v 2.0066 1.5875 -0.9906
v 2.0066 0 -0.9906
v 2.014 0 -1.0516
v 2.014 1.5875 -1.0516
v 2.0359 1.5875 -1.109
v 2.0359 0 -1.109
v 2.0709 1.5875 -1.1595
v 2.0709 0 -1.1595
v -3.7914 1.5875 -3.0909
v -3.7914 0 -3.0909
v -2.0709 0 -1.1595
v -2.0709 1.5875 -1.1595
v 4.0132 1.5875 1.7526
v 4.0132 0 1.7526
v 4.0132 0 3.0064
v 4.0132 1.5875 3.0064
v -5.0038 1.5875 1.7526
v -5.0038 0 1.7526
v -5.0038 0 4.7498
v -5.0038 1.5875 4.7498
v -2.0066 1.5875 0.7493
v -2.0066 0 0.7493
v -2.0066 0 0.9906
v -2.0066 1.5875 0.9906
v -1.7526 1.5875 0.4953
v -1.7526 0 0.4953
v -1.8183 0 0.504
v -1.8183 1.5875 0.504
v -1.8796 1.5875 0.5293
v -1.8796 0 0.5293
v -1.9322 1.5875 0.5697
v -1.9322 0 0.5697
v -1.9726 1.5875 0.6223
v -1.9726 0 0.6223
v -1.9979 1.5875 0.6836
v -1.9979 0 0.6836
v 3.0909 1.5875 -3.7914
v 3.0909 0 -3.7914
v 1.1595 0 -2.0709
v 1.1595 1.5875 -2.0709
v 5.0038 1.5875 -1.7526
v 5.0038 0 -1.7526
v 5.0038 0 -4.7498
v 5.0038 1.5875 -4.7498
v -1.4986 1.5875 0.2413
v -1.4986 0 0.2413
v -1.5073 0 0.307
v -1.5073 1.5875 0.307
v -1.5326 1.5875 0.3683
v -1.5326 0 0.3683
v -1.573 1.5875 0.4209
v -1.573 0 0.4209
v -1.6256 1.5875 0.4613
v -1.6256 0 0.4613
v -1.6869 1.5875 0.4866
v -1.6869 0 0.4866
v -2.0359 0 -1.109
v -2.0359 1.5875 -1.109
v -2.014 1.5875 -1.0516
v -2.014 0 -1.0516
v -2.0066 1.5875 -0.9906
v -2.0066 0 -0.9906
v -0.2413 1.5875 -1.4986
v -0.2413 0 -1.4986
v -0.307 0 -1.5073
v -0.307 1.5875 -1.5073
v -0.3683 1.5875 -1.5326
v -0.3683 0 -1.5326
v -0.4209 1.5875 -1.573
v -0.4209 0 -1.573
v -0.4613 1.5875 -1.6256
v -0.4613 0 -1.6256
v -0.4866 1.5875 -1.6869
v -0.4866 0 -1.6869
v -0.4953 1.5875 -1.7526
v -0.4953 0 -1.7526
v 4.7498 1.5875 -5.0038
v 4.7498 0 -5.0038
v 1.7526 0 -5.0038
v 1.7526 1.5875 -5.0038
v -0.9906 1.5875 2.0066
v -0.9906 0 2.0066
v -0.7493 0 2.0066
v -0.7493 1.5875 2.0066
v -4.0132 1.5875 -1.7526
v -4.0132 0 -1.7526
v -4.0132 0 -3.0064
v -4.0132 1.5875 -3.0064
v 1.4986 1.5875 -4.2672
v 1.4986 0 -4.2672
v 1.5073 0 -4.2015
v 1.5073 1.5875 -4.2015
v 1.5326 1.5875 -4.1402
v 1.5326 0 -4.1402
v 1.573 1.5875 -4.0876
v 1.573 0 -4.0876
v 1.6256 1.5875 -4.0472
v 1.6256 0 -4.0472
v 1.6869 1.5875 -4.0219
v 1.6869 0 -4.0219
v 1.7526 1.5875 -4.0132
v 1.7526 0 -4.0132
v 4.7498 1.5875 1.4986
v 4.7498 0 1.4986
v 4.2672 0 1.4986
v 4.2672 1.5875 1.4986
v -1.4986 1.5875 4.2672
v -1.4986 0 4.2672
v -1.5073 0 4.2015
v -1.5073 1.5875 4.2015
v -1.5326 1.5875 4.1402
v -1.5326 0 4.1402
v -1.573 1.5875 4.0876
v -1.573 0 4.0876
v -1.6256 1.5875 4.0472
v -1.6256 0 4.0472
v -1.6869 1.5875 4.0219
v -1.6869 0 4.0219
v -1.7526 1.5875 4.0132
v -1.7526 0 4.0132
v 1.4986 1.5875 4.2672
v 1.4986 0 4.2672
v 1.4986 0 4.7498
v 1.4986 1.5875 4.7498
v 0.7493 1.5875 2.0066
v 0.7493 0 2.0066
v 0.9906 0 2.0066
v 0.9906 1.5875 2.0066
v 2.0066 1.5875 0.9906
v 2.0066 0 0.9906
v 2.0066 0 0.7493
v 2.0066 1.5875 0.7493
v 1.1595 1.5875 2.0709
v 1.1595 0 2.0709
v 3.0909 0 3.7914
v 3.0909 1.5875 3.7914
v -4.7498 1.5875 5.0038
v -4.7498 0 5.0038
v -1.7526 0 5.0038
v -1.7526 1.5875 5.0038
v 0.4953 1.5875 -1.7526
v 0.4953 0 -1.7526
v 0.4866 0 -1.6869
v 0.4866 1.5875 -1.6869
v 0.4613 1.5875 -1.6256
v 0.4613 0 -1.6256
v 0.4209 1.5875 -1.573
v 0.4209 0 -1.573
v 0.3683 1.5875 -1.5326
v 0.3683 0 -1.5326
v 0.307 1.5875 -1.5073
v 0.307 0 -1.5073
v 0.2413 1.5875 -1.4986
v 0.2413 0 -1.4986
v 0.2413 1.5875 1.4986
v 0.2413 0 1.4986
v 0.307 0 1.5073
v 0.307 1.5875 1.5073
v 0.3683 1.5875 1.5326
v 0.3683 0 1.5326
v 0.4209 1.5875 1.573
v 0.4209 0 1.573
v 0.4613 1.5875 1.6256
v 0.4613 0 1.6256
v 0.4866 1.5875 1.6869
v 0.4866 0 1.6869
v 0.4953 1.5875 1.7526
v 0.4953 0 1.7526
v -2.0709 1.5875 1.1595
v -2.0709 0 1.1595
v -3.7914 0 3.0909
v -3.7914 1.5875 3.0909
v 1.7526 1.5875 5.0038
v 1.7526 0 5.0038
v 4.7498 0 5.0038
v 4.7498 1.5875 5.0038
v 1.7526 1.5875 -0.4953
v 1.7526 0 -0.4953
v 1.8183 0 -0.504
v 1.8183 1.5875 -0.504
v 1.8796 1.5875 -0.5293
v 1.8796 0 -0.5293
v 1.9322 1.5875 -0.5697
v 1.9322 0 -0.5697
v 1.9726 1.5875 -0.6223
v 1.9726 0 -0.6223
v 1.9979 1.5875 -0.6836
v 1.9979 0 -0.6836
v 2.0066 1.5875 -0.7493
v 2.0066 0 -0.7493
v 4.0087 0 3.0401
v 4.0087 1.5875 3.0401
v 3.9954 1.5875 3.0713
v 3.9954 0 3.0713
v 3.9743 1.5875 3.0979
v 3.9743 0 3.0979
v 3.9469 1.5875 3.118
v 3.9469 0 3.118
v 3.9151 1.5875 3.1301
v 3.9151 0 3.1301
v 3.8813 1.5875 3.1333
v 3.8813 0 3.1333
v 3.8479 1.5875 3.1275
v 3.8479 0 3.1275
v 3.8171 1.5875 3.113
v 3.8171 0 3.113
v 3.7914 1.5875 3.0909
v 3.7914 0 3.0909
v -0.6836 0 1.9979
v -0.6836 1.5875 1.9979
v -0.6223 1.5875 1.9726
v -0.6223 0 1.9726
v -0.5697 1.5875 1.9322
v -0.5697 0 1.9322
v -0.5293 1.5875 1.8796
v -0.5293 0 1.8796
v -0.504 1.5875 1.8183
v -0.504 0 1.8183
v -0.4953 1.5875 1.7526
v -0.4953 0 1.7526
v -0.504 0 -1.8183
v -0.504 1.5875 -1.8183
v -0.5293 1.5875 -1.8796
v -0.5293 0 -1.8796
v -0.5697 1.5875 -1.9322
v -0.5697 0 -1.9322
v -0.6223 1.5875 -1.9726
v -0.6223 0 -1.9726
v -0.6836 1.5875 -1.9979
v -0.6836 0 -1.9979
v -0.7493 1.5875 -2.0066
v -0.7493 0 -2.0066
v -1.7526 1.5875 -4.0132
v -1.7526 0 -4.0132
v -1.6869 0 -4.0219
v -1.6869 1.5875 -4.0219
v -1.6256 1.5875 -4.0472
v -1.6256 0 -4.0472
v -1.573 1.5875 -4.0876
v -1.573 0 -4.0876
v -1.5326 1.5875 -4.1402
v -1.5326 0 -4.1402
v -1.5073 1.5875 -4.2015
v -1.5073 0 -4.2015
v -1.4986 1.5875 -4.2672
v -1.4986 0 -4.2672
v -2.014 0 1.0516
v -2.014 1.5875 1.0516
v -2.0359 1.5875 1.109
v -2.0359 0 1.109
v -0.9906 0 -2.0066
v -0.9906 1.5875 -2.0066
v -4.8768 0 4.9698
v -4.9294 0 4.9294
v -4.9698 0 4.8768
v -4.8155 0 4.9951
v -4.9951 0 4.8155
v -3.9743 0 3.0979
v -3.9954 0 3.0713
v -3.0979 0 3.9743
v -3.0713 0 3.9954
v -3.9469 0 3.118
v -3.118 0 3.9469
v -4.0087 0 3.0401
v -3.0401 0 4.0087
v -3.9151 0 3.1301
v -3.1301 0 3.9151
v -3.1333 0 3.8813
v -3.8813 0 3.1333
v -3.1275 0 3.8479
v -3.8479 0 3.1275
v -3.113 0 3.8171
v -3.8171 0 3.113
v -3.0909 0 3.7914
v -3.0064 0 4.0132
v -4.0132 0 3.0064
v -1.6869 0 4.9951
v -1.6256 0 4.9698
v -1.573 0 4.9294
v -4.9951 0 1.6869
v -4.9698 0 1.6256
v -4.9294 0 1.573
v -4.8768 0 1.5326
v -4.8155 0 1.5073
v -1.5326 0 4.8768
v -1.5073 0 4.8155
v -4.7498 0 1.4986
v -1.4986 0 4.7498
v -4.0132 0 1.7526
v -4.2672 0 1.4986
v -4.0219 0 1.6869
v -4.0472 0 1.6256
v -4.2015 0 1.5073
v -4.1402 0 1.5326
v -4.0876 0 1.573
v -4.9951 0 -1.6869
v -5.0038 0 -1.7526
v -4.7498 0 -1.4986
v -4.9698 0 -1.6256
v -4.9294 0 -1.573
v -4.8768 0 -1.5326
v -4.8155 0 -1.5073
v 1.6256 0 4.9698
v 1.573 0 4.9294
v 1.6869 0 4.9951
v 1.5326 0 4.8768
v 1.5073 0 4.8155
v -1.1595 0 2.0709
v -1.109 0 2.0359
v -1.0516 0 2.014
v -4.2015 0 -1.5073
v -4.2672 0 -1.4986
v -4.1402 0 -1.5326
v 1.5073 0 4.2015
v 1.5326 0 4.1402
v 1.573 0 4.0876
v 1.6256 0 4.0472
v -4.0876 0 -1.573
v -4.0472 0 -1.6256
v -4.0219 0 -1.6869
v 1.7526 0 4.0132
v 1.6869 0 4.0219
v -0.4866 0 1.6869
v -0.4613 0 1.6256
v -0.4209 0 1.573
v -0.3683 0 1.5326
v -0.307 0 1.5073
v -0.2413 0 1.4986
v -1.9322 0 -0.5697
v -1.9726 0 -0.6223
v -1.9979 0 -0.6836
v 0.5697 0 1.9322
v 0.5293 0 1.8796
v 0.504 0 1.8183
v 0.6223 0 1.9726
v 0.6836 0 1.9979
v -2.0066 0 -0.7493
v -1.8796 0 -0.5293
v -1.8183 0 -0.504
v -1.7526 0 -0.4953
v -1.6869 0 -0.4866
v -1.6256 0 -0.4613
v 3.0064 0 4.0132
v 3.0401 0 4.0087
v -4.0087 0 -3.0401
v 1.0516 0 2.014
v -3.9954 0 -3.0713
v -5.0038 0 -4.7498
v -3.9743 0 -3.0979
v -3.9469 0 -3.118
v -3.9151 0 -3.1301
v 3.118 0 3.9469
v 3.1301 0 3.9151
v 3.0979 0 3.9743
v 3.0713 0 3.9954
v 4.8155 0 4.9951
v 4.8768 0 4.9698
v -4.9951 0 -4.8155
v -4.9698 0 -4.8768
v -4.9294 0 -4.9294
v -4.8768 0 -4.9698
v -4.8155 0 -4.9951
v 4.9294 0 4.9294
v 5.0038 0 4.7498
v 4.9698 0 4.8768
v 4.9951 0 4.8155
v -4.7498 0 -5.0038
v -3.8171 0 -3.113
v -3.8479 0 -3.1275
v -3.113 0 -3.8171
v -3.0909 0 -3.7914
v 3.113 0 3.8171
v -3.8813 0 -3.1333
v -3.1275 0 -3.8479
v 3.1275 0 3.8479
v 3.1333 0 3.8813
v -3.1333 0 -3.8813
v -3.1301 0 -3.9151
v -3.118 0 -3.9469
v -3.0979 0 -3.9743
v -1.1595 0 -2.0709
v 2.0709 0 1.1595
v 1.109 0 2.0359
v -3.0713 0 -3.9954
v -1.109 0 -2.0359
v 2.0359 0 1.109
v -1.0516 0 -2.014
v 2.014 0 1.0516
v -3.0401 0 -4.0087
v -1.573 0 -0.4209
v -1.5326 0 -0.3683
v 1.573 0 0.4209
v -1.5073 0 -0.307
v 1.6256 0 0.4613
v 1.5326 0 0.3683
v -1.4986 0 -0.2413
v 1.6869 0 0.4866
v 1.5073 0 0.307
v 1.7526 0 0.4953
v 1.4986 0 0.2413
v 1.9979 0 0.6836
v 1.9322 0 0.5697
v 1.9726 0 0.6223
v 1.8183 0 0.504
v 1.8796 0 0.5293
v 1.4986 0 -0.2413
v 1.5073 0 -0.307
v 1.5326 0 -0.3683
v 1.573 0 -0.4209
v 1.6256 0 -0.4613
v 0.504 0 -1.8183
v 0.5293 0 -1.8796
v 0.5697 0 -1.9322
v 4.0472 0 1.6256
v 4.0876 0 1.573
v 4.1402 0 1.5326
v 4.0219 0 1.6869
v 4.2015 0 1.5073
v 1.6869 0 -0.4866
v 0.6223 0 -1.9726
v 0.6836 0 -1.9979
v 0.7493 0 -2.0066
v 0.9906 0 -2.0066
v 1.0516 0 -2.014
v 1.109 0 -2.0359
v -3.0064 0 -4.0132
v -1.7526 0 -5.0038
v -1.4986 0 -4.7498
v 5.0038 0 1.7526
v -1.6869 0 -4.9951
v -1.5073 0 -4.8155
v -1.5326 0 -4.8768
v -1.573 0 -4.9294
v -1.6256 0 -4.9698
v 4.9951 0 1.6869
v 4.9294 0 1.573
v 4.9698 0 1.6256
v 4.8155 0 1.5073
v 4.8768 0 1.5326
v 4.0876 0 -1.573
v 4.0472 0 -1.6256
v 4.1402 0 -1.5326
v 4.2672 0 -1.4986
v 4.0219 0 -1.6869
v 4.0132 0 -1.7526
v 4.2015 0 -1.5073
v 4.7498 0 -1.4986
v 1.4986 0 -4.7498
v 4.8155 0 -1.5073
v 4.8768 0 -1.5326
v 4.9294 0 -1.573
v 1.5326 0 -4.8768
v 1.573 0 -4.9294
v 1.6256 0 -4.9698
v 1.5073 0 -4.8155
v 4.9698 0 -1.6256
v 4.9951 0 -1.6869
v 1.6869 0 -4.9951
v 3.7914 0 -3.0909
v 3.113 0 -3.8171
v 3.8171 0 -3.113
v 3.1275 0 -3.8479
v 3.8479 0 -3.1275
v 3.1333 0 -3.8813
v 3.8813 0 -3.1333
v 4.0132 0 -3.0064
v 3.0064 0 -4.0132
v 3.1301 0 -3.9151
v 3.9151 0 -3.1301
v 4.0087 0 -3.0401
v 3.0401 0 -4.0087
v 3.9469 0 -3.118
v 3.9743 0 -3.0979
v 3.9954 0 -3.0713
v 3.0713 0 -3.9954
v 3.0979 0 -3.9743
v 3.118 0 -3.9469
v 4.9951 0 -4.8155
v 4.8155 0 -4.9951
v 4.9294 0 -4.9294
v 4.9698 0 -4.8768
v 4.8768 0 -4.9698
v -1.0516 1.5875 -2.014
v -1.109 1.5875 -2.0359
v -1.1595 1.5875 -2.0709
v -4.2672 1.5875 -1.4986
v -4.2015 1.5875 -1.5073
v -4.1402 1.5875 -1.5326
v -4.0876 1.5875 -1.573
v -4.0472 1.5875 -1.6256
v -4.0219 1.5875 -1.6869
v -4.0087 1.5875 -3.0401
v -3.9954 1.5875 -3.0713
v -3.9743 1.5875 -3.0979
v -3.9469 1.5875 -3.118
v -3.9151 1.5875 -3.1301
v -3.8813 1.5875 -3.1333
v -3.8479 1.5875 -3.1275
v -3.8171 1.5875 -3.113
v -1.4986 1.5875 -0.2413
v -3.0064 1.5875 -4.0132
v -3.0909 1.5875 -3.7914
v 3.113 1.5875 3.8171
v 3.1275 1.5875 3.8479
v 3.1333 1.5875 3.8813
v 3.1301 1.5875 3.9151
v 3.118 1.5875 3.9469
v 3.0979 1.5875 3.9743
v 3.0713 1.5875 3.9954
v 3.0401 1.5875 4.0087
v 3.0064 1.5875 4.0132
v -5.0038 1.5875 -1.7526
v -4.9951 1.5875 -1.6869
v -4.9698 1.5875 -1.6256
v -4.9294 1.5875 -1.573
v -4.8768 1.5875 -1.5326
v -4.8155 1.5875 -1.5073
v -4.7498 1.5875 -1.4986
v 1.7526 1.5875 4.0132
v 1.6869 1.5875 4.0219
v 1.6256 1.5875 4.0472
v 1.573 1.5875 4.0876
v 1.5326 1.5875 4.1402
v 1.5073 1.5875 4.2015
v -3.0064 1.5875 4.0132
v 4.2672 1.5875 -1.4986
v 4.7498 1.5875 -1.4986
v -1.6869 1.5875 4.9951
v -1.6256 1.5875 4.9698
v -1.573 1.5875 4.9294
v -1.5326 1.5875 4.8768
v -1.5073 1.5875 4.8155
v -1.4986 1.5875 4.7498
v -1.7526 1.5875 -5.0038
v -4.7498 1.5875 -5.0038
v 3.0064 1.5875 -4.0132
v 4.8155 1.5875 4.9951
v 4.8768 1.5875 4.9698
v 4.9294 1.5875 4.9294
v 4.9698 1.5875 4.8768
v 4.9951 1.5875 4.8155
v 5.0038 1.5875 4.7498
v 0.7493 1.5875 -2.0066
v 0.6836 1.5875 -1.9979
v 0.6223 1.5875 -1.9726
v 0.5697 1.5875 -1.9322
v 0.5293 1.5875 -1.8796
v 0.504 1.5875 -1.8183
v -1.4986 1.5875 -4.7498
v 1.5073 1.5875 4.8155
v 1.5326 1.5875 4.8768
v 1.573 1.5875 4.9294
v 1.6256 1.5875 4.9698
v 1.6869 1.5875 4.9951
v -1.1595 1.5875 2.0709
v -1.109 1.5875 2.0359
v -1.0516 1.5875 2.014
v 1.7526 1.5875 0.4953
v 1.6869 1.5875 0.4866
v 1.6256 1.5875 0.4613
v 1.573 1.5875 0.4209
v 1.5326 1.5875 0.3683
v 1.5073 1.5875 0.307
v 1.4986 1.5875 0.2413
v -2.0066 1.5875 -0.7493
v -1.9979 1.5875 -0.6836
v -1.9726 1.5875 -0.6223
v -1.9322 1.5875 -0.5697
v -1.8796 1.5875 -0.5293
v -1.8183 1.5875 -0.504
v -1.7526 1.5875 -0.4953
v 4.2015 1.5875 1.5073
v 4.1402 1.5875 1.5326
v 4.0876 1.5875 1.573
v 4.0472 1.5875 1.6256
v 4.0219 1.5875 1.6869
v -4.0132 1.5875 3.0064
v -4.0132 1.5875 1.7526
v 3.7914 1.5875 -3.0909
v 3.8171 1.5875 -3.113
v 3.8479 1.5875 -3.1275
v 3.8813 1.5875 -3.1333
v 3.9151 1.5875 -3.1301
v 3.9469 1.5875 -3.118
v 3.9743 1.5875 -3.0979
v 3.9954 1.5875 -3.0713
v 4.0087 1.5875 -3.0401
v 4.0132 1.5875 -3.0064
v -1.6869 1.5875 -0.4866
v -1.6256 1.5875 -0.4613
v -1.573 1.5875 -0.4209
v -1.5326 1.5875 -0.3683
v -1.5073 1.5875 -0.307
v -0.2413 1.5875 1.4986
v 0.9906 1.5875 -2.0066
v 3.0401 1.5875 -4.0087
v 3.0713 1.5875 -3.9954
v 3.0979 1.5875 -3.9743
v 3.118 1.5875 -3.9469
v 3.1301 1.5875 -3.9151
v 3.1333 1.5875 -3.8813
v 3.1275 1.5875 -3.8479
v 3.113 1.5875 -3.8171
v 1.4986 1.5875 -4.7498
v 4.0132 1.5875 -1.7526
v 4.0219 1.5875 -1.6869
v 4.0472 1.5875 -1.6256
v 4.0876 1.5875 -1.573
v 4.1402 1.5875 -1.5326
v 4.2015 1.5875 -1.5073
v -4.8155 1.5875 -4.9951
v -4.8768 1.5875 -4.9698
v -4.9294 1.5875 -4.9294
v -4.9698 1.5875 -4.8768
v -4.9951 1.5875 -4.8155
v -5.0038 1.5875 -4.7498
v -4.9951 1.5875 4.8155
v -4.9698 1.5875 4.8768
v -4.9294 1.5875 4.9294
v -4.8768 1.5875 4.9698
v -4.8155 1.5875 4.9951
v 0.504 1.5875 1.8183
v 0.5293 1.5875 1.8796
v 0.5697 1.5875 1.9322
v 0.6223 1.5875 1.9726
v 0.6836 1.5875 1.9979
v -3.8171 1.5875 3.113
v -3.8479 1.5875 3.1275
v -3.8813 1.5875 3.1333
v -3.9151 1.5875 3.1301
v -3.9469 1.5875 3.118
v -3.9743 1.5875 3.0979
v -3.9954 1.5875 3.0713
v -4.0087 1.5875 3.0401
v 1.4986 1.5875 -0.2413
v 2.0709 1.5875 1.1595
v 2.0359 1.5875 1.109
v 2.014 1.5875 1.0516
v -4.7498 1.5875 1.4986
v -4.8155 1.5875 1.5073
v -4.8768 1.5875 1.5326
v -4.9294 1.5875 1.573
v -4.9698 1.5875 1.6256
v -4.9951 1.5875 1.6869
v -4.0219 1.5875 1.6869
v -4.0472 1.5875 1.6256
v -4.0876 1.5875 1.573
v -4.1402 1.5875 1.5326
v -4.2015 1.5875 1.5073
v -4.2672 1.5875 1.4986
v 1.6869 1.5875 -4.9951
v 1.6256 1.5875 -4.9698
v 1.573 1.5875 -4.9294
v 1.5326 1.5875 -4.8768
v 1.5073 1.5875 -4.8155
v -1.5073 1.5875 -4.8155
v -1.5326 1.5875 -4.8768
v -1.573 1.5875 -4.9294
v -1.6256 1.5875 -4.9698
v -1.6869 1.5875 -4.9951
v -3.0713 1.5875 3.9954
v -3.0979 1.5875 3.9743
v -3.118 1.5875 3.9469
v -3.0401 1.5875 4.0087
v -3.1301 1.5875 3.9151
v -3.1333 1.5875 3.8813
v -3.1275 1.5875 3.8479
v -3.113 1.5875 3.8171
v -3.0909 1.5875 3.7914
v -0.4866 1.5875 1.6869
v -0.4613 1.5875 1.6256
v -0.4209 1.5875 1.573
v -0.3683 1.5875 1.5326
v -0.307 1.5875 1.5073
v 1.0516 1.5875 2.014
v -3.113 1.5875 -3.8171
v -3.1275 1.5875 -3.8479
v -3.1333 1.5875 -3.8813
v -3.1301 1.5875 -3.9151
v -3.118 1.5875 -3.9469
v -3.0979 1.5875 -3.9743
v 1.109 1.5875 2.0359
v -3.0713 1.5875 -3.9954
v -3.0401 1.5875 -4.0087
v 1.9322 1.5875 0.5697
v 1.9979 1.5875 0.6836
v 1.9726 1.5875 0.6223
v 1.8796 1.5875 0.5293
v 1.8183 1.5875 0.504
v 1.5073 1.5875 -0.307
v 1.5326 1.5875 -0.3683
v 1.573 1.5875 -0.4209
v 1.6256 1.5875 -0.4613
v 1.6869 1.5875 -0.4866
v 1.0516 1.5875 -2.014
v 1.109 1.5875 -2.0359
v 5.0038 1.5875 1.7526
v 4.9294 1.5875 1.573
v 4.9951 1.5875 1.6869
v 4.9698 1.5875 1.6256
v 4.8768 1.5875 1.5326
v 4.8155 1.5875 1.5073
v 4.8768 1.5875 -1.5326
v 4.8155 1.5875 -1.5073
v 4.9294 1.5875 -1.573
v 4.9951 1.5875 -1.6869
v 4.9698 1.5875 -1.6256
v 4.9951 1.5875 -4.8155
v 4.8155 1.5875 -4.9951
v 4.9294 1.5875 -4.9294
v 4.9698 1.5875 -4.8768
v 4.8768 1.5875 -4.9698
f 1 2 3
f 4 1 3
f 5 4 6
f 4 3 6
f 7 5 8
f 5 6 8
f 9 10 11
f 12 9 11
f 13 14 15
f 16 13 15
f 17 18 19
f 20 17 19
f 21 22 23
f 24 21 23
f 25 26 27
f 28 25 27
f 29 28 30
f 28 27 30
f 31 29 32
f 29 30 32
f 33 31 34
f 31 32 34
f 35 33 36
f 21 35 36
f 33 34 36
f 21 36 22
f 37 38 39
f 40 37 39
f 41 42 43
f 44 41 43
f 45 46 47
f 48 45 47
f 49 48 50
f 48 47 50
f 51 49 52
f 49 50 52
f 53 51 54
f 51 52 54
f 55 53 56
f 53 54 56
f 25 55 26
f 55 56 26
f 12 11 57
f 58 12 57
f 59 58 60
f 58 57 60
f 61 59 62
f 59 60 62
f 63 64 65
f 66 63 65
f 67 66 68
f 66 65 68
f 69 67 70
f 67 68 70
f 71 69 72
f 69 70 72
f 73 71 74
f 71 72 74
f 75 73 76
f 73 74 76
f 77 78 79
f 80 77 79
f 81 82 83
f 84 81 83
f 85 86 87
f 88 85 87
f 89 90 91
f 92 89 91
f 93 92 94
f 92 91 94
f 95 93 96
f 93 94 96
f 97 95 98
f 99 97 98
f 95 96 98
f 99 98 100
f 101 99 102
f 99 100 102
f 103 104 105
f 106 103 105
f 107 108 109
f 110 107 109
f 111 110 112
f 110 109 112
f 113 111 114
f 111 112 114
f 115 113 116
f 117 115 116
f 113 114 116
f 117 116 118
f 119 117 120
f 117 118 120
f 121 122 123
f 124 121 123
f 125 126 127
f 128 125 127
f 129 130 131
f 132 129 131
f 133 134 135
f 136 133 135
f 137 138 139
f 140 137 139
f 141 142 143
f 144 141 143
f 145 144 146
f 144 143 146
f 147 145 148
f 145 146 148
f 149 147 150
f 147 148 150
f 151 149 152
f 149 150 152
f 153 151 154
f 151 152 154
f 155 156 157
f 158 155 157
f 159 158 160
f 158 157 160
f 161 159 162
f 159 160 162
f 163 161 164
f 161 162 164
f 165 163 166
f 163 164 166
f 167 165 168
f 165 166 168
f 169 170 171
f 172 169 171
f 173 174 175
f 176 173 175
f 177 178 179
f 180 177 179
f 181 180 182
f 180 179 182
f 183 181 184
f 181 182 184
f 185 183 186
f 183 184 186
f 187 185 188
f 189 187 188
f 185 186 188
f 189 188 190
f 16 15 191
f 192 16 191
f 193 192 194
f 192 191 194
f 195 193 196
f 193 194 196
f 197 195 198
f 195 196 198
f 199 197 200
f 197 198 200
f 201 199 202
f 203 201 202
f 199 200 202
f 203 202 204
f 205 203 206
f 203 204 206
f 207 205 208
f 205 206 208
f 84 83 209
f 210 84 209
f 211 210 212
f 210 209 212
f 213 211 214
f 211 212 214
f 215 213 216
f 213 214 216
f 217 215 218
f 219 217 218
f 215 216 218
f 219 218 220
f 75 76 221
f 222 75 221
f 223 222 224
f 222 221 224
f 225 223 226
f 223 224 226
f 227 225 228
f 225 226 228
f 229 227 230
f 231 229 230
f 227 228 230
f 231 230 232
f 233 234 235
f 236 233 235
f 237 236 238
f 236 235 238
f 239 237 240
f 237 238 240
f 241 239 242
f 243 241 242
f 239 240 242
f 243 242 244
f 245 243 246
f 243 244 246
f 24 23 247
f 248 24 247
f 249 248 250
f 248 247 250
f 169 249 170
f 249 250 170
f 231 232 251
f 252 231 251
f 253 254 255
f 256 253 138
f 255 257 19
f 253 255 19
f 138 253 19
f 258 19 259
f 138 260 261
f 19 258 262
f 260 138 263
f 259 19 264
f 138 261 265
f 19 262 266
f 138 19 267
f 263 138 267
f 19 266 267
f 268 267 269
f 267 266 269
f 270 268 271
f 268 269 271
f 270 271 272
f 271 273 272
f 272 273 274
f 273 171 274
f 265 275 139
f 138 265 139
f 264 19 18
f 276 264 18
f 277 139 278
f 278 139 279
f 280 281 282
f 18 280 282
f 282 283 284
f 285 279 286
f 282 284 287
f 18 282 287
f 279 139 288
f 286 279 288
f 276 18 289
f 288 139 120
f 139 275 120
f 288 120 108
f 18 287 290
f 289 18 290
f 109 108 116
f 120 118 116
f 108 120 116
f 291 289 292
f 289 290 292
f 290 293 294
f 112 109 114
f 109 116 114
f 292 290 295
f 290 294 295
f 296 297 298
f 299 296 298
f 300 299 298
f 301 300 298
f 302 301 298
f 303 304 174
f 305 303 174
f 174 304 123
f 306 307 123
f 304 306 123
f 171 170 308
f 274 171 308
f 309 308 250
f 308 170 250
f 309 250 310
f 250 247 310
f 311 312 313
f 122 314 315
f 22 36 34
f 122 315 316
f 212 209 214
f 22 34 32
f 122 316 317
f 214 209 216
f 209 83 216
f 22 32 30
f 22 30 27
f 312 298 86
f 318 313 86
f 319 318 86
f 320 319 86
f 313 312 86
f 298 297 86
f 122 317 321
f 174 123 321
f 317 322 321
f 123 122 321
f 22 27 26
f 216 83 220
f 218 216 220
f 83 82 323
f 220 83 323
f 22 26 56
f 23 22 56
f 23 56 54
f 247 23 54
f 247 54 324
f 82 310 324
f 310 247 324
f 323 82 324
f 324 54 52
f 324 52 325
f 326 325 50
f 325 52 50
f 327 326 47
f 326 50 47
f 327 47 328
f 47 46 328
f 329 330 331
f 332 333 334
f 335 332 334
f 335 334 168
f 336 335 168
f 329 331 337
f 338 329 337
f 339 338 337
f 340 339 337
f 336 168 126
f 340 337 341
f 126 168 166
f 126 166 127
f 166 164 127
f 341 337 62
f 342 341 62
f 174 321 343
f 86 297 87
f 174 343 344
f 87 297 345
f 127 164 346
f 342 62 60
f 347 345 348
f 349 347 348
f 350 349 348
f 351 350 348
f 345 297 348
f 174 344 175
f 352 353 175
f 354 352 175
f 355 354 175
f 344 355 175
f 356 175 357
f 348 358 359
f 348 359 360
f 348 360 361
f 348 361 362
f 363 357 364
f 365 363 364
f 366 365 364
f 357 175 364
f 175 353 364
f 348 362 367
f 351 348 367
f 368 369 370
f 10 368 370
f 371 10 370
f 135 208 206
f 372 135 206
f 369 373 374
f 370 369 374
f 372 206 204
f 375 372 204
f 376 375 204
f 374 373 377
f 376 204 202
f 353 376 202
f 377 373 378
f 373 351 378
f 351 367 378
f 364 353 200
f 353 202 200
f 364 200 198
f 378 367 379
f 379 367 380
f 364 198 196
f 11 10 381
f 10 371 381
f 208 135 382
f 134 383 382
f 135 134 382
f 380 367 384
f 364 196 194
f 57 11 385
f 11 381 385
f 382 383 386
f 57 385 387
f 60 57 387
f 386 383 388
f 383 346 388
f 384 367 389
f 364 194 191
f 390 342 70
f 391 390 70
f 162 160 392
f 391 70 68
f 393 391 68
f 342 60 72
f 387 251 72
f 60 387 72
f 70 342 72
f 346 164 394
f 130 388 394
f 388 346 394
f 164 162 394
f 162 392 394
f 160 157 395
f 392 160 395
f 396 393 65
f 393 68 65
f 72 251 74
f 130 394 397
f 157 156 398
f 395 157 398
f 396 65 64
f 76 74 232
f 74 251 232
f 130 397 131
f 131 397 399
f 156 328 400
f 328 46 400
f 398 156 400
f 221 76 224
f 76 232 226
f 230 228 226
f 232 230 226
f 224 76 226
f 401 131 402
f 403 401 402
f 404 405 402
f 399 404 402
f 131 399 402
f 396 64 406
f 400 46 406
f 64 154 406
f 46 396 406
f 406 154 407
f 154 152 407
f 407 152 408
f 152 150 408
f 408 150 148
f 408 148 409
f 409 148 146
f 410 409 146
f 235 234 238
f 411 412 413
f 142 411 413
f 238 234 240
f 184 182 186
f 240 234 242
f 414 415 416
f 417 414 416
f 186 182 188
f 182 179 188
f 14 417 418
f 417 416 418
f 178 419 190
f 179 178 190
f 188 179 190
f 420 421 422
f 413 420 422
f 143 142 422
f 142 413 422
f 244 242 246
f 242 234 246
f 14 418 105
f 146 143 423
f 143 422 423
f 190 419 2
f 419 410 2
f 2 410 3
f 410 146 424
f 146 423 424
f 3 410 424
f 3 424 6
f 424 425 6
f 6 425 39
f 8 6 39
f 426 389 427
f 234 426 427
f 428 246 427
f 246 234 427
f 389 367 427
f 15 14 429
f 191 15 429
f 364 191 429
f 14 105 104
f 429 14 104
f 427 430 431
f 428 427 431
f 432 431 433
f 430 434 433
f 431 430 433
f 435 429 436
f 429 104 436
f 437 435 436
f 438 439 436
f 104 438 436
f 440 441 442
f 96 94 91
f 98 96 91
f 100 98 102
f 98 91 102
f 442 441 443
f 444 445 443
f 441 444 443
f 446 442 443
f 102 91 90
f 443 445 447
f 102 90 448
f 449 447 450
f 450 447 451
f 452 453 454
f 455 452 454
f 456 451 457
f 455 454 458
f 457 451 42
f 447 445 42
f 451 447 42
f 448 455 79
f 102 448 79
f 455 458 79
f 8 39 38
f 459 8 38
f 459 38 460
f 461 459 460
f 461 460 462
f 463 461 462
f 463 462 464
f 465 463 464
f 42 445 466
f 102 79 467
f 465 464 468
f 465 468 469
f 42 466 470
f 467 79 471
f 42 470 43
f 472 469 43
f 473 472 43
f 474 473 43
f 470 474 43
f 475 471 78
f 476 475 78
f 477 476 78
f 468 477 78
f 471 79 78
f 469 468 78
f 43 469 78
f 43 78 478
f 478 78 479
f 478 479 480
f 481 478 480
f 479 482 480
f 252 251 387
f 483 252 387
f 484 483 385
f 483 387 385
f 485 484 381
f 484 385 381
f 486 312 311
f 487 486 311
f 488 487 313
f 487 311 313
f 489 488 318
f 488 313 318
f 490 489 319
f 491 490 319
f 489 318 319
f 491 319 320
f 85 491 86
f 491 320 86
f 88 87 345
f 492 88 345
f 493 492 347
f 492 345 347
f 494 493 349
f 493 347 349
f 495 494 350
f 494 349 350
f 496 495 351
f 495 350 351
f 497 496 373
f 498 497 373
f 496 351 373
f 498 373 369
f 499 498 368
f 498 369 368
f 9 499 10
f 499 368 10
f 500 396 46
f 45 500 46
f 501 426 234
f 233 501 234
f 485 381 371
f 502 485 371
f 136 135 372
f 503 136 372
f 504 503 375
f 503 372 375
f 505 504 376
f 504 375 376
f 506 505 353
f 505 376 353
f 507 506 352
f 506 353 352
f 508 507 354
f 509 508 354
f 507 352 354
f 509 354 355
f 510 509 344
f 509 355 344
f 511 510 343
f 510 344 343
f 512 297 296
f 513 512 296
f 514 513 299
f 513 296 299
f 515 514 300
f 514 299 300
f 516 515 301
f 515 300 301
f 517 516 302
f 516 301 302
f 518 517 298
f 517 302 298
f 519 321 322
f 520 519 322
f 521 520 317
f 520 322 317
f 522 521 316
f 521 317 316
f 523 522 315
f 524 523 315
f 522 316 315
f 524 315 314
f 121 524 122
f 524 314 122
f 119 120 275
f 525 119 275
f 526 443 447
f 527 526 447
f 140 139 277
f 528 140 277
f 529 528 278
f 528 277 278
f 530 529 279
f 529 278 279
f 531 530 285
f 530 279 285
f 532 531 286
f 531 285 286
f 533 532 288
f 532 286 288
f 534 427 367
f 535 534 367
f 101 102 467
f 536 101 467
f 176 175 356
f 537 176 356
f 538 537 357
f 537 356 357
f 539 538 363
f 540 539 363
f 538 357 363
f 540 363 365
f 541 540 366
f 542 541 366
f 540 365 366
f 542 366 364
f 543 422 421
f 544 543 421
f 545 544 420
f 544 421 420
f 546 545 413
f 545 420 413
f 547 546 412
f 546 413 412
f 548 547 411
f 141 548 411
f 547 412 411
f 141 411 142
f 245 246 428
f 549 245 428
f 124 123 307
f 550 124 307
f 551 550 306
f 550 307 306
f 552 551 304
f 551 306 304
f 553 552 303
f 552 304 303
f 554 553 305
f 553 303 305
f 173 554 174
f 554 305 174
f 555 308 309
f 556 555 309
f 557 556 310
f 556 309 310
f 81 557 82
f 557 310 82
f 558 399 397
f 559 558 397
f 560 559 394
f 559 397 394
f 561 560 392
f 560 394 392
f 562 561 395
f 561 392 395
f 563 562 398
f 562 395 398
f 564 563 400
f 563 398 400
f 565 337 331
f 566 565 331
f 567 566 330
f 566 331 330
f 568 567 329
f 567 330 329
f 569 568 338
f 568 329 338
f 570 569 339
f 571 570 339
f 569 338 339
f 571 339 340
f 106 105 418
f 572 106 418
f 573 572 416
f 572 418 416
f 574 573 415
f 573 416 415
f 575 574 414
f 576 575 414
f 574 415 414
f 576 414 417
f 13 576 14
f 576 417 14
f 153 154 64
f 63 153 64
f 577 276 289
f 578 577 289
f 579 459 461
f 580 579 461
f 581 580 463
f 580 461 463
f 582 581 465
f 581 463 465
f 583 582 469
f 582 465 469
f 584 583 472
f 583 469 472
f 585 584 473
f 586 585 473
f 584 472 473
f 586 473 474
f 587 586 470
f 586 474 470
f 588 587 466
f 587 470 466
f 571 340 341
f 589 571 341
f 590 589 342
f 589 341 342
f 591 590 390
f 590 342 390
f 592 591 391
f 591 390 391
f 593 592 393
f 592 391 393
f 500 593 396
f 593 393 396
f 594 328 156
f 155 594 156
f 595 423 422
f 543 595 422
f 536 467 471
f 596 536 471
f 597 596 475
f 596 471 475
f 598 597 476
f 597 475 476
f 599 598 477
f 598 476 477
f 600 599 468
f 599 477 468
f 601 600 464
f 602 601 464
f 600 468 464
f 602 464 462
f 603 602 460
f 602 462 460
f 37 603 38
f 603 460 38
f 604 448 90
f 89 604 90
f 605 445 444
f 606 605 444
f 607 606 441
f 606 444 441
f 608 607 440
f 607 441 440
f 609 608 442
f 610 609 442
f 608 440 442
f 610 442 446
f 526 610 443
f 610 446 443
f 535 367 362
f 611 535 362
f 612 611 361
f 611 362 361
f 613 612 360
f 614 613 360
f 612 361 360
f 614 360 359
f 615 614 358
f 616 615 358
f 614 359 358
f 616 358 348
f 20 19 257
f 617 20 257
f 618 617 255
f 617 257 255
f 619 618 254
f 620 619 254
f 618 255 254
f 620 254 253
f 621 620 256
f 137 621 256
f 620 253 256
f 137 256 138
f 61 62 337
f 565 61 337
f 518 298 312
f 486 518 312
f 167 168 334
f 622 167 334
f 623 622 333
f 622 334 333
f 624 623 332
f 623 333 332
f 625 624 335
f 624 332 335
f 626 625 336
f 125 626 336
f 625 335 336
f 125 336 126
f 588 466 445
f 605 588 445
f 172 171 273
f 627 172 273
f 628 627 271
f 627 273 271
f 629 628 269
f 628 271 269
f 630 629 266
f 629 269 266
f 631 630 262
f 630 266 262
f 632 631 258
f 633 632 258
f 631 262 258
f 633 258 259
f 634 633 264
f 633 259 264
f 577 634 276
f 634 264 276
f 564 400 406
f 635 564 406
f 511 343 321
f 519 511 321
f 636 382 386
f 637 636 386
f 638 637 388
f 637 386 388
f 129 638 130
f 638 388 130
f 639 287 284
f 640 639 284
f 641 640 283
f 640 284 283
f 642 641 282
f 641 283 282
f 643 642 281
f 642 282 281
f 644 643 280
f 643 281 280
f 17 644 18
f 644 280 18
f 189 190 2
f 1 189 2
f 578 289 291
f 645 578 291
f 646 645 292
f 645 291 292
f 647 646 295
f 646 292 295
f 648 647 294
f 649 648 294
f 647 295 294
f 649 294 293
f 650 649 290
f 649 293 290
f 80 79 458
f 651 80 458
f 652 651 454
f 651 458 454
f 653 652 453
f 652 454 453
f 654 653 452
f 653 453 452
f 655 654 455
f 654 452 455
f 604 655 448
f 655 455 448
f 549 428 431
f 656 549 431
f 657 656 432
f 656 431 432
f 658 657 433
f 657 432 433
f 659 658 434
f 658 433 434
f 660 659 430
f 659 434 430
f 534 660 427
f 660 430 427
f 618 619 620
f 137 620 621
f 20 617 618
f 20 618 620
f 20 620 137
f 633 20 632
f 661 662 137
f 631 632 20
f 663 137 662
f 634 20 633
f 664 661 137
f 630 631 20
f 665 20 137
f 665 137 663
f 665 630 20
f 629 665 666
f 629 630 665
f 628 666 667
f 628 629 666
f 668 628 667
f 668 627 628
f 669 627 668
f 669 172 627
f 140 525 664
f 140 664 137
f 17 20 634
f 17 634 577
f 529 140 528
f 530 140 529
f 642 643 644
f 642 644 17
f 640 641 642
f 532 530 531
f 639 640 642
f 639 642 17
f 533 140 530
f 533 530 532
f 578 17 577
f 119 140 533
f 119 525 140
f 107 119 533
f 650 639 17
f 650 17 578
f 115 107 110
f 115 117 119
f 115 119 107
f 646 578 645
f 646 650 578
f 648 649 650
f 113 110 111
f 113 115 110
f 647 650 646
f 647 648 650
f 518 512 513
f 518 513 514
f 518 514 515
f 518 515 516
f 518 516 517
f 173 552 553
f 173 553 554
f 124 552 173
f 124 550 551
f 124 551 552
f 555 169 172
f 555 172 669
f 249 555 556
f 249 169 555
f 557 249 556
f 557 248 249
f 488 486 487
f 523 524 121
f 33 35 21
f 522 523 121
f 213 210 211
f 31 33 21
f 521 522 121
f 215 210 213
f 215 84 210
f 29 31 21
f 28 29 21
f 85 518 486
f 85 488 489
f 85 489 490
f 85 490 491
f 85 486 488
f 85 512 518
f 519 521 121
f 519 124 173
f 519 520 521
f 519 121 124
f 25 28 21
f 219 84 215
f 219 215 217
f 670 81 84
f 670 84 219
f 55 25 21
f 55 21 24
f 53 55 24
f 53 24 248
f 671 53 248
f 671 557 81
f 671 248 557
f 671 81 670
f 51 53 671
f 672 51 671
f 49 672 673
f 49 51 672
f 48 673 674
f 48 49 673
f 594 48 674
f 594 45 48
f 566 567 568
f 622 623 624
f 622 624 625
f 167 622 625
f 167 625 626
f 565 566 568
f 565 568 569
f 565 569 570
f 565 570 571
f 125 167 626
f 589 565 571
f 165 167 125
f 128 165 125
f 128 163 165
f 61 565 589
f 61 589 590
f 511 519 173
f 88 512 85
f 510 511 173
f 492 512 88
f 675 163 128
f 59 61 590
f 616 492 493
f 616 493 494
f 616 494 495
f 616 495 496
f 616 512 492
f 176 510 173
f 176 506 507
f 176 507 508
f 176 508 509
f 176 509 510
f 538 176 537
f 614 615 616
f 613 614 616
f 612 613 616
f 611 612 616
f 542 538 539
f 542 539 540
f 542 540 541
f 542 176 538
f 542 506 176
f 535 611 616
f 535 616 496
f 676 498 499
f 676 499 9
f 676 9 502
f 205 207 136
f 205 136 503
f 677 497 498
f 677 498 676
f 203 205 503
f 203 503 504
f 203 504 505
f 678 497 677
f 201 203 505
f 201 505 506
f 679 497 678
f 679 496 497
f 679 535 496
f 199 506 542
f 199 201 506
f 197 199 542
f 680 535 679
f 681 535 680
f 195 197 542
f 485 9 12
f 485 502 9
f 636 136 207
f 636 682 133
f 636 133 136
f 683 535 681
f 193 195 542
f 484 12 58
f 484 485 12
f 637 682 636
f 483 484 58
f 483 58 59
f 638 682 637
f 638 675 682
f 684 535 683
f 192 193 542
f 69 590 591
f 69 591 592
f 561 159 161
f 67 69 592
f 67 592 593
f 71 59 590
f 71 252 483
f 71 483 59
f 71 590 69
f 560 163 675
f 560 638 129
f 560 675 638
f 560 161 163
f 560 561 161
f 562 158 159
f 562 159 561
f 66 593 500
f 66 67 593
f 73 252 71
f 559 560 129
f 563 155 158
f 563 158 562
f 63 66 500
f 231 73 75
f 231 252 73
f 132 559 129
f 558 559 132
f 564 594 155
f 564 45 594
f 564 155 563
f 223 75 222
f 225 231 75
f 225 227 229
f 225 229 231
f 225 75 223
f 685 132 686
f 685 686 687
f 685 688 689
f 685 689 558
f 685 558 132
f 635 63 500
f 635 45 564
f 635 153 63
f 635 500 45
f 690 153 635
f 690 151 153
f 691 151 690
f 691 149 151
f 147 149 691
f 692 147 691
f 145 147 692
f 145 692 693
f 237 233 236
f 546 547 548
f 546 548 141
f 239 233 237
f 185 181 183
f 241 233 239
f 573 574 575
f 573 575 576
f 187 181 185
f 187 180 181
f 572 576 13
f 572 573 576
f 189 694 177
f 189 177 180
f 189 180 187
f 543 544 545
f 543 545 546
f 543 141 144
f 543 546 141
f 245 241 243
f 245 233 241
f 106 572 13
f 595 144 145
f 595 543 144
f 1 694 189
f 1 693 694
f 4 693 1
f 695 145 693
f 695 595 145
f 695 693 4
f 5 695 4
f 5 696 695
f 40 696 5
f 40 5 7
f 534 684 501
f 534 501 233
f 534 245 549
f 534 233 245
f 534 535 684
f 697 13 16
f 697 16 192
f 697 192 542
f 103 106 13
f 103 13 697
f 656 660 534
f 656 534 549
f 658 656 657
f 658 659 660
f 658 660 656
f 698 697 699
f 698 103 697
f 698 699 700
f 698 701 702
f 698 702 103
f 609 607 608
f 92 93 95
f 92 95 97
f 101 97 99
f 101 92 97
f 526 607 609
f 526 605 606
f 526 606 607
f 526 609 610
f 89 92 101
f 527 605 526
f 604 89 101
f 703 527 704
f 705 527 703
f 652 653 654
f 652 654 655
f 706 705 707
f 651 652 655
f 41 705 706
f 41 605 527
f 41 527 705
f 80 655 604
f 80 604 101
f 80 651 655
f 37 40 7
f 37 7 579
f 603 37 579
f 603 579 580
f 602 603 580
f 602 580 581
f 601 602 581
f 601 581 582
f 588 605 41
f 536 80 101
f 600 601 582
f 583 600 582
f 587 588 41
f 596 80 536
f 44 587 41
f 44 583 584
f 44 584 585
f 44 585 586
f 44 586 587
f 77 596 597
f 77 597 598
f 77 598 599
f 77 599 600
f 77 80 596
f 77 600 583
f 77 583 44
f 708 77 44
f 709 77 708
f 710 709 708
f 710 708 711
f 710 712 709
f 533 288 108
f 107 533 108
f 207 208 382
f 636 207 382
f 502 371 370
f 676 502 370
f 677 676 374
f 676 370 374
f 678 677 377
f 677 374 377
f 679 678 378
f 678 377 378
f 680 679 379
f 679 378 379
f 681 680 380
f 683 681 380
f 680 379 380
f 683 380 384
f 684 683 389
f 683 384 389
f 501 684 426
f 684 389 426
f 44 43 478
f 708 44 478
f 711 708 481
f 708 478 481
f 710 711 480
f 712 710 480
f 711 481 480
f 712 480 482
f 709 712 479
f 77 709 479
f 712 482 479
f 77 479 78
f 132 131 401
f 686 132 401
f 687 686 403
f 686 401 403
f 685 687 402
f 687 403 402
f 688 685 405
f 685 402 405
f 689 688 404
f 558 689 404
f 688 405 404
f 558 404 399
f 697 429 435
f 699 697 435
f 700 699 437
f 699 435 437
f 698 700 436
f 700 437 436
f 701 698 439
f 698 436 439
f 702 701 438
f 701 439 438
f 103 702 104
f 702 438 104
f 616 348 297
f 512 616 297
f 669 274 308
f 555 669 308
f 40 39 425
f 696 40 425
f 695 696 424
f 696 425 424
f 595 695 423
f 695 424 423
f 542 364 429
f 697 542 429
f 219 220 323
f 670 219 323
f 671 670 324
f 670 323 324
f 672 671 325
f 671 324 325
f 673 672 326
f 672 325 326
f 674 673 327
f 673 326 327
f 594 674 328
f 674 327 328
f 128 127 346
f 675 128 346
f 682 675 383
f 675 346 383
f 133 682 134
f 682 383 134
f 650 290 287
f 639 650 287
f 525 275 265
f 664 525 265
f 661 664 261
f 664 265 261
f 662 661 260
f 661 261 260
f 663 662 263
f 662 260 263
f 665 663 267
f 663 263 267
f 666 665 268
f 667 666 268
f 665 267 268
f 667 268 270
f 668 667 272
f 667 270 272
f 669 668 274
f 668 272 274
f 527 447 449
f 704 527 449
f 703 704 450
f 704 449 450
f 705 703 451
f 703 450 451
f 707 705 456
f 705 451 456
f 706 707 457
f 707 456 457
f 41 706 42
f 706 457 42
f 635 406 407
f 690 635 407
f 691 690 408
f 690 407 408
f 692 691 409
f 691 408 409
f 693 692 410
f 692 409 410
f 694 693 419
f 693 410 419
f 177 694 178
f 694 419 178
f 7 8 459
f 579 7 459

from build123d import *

# Parameters (mm, degrees)
BOSS_EXTRUDE1_DEPTH = 1.5875


with BuildPart() as part:
    # Sketch1 → Boss-Extrude1 (new body)
    with BuildSketch(Plane(origin=(0, 0, 0), x_dir=(1, 0, 0), z_dir=(0, 1, 0))):
        with BuildLine():
            Line((-1.159549536, 2.070936998), (-3.090908521, 3.791368499))
            ThreePointArc((-3.090908521, 3.791368499), (-3.125119474, 3.931396235), (-3.006433754, 4.0132))
            Line((-3.006433754, 4.0132), (-1.7526, 4.0132))
            ThreePointArc((-1.7526, 4.0132), (-1.572994878, 4.087594878), (-1.4986, 4.2672))
            Line((-1.4986, 4.2672), (-1.4986, 4.7498))
            ThreePointArc((-1.4986, 4.7498), (-1.572994878, 4.929405122), (-1.7526, 5.0038))
            Line((-1.7526, 5.0038), (-4.7498, 5.0038))
            ThreePointArc((-4.7498, 5.0038), (-4.929405122, 4.929405122), (-5.0038, 4.7498))
            Line((-5.0038, 4.7498), (-5.0038, 1.7526))
            ThreePointArc((-5.0038, 1.7526), (-4.929405122, 1.572994878), (-4.7498, 1.4986))
            Line((-4.7498, 1.4986), (-4.2672, 1.4986))
            ThreePointArc((-4.2672, 1.4986), (-4.087594878, 1.572994878), (-4.0132, 1.7526))
            Line((-4.0132, 1.7526), (-4.0132, 3.006433754))
            ThreePointArc((-4.0132, 3.006433754), (-3.931396235, 3.125119474), (-3.791368499, 3.090908521))
            Line((-3.791368499, 3.090908521), (-2.070936998, 1.159549536))
            ThreePointArc((-2.070936998, 1.159549536), (-2.023228558, 1.08099247), (-2.0066, 0.9906))
            Line((-2.0066, 0.9906), (-2.0066, 0.7493))
            ThreePointArc((-2.0066, 0.7493), (-1.932205122, 0.569694878), (-1.7526, 0.4953))
            ThreePointArc((-1.7526, 0.4953), (-1.572994878, 0.420905122), (-1.4986, 0.2413))
            Line((-1.4986, 0.2413), (-1.4986, -0.2413))
            ThreePointArc((-1.4986, -0.2413), (-1.572994878, -0.420905122), (-1.7526, -0.4953))
            ThreePointArc((-1.7526, -0.4953), (-1.932205122, -0.569694878), (-2.0066, -0.7493))
            Line((-2.0066, -0.7493), (-2.0066, -0.9906))
            ThreePointArc((-2.0066, -0.9906), (-2.023228558, -1.08099247), (-2.070936998, -1.159549536))
            Line((-2.070936998, -1.159549536), (-3.791368499, -3.090908521))
            ThreePointArc((-3.791368499, -3.090908521), (-3.931396235, -3.125119474), (-4.0132, -3.006433754))
            Line((-4.0132, -3.006433754), (-4.0132, -1.7526))
            ThreePointArc((-4.0132, -1.7526), (-4.087594878, -1.572994878), (-4.2672, -1.4986))
            Line((-4.2672, -1.4986), (-4.7498, -1.4986))
            ThreePointArc((-4.7498, -1.4986), (-4.929405122, -1.572994878), (-5.0038, -1.7526))
            Line((-5.0038, -1.7526), (-5.0038, -4.7498))
            ThreePointArc((-5.0038, -4.7498), (-4.929405122, -4.929405122), (-4.7498, -5.0038))
            Line((-4.7498, -5.0038), (-1.7526, -5.0038))
            ThreePointArc((-1.7526, -5.0038), (-1.572994878, -4.929405122), (-1.4986, -4.7498))
            Line((-1.4986, -4.7498), (-1.4986, -4.2672))
            ThreePointArc((-1.4986, -4.2672), (-1.572994878, -4.087594878), (-1.7526, -4.0132))
            Line((-1.7526, -4.0132), (-3.006433754, -4.0132))
            ThreePointArc((-3.006433754, -4.0132), (-3.125119474, -3.931396235), (-3.090908521, -3.791368499))
            Line((-3.090908521, -3.791368499), (-1.159549536, -2.070936998))
            ThreePointArc((-1.159549536, -2.070936998), (-1.08099247, -2.023228558), (-0.9906, -2.0066))
            Line((-0.9906, -2.0066), (-0.7493, -2.0066))
            ThreePointArc((-0.7493, -2.0066), (-0.569694878, -1.932205122), (-0.4953, -1.7526))
            ThreePointArc((-0.4953, -1.7526), (-0.420905122, -1.572994878), (-0.2413, -1.4986))
            Line((-0.2413, -1.4986), (0.2413, -1.4986))
            ThreePointArc((0.2413, -1.4986), (0.420905122, -1.572994878), (0.4953, -1.7526))
            ThreePointArc((0.4953, -1.7526), (0.569694878, -1.932205122), (0.7493, -2.0066))
            Line((0.7493, -2.0066), (0.9906, -2.0066))
            ThreePointArc((0.9906, -2.0066), (1.08099247, -2.023228558), (1.159549536, -2.070936998))
            Line((1.159549536, -2.070936998), (3.090908521, -3.791368499))
            ThreePointArc((3.090908521, -3.791368499), (3.125119474, -3.931396235), (3.006433754, -4.0132))
            Line((3.006433754, -4.0132), (1.7526, -4.0132))
            ThreePointArc((1.7526, -4.0132), (1.572994878, -4.087594878), (1.4986, -4.2672))
            Line((1.4986, -4.2672), (1.4986, -4.7498))
            ThreePointArc((1.4986, -4.7498), (1.572994878, -4.929405122), (1.7526, -5.0038))
            Line((1.7526, -5.0038), (4.7498, -5.0038))
            ThreePointArc((4.7498, -5.0038), (4.929405122, -4.929405122), (5.0038, -4.7498))
            Line((5.0038, -4.7498), (5.0038, -1.7526))
            ThreePointArc((5.0038, -1.7526), (4.929405122, -1.572994878), (4.7498, -1.4986))
            Line((4.7498, -1.4986), (4.2672, -1.4986))
            ThreePointArc((4.2672, -1.4986), (4.087594878, -1.572994878), (4.0132, -1.7526))
            Line((4.0132, -1.7526), (4.0132, -3.006433754))
            ThreePointArc((4.0132, -3.006433754), (3.931396235, -3.125119474), (3.791368499, -3.090908521))
            Line((3.791368499, -3.090908521), (2.070936998, -1.159549536))
            ThreePointArc((2.070936998, -1.159549536), (2.023228558, -1.08099247), (2.0066, -0.9906))
            Line((2.0066, -0.9906), (2.0066, -0.7493))
            ThreePointArc((2.0066, -0.7493), (1.932205122, -0.569694878), (1.7526, -0.4953))
            ThreePointArc((1.7526, -0.4953), (1.572994878, -0.420905122), (1.4986, -0.2413))
            Line((1.4986, -0.2413), (1.4986, 0.2413))
            ThreePointArc((1.4986, 0.2413), (1.572994878, 0.420905122), (1.7526, 0.4953))
            ThreePointArc((1.7526, 0.4953), (1.932205122, 0.569694878), (2.0066, 0.7493))
            Line((2.0066, 0.7493), (2.0066, 0.9906))
            ThreePointArc((2.0066, 0.9906), (2.023228558, 1.08099247), (2.070936998, 1.159549536))
            Line((2.070936998, 1.159549536), (3.791368499, 3.090908521))
            ThreePointArc((3.791368499, 3.090908521), (3.931396235, 3.125119474), (4.0132, 3.006433754))
            Line((4.0132, 3.006433754), (4.0132, 1.7526))
            ThreePointArc((4.0132, 1.7526), (4.087594878, 1.572994878), (4.2672, 1.4986))
            Line((4.2672, 1.4986), (4.7498, 1.4986))
            ThreePointArc((4.7498, 1.4986), (4.929405122, 1.572994878), (5.0038, 1.7526))
            Line((5.0038, 1.7526), (5.0038, 4.7498))
            ThreePointArc((5.0038, 4.7498), (4.929405122, 4.929405122), (4.7498, 5.0038))
            Line((4.7498, 5.0038), (1.7526, 5.0038))
            ThreePointArc((1.7526, 5.0038), (1.572994878, 4.929405122), (1.4986, 4.7498))
            Line((1.4986, 4.7498), (1.4986, 4.2672))
            ThreePointArc((1.4986, 4.2672), (1.572994878, 4.087594878), (1.7526, 4.0132))
            Line((1.7526, 4.0132), (3.006433754, 4.0132))
            ThreePointArc((3.006433754, 4.0132), (3.125119474, 3.931396235), (3.090908521, 3.791368499))
            Line((3.090908521, 3.791368499), (1.159549536, 2.070936998))
            ThreePointArc((1.159549536, 2.070936998), (1.08099247, 2.023228558), (0.9906, 2.0066))
            Line((0.9906, 2.0066), (0.7493, 2.0066))
            ThreePointArc((0.7493, 2.0066), (0.569694878, 1.932205122), (0.4953, 1.7526))
            ThreePointArc((0.4953, 1.7526), (0.420905122, 1.572994878), (0.2413, 1.4986))
            Line((0.2413, 1.4986), (-0.2413, 1.4986))
            ThreePointArc((-0.2413, 1.4986), (-0.420905122, 1.572994878), (-0.4953, 1.7526))
            ThreePointArc((-0.4953, 1.7526), (-0.569694878, 1.932205122), (-0.7493, 2.0066))
            Line((-0.7493, 2.0066), (-0.9906, 2.0066))
            ThreePointArc((-0.9906, 2.0066), (-1.08099247, 2.023228558), (-1.159549536, 2.070936998))
        make_face()
    extrude(amount=BOSS_EXTRUDE1_DEPTH)


solid = part.part
